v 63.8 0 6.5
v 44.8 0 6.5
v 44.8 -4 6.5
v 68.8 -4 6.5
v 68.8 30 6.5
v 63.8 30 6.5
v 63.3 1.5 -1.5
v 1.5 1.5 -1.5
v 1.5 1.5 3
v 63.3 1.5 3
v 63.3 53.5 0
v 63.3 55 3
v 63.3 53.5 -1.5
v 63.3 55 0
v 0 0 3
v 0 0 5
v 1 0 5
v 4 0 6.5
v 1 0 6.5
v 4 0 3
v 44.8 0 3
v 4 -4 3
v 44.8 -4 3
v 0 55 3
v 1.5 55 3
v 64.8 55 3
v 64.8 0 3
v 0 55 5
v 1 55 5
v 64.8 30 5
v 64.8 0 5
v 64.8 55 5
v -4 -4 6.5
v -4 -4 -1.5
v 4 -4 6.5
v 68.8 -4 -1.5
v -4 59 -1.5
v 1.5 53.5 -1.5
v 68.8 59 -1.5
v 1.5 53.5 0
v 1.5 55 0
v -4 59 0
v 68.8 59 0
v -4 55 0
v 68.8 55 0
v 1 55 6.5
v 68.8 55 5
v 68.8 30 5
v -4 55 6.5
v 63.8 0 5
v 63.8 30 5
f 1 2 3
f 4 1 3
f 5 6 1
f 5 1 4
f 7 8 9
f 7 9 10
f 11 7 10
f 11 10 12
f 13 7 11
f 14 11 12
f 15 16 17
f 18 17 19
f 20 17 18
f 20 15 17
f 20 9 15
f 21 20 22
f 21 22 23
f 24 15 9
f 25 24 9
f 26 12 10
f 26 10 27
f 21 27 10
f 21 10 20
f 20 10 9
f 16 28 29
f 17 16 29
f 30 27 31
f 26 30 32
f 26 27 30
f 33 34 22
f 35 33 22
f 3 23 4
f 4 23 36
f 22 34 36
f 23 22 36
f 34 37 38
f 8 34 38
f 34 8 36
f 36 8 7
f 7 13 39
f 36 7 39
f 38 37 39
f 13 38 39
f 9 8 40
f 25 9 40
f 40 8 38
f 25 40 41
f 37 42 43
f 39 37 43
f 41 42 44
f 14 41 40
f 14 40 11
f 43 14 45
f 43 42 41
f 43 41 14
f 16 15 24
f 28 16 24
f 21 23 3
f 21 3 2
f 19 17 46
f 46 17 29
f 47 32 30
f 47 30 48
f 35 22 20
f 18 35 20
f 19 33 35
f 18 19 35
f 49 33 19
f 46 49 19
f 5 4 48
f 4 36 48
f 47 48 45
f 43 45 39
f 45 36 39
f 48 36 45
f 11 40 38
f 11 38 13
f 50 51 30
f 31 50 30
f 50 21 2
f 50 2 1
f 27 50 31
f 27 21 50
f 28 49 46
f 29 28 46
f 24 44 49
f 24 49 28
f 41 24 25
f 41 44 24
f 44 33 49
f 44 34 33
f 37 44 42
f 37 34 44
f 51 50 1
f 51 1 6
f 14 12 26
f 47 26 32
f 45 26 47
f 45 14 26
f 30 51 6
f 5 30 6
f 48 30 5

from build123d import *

# Parameters (mm, degrees)
BOX004_W      = 4
BOX004_H      = 55
BOX004_DEPTH  = 2
BOX005_W      = 4
BOX005_H      = 55
BOX005_DEPTH  = 2
BOX006_W      = 5
BOX006_H      = 30
BOX006_DEPTH  = 1.5
BOX007_W      = 24
BOX007_H      = 4
BOX007_DEPTH  = 3.5
BOX010_W      = 8
BOX010_H      = 4
BOX010_DEPTH  = 3.5
BOX003_W      = 5
BOX003_H      = 55
BOX003_DEPTH  = 1.5
BOX011_W      = 5.5
BOX011_H      = 59
BOX011_DEPTH  = 3
BOX012_W      = 5.5
BOX012_H      = 59
BOX012_DEPTH  = 3
BOX013_W      = 68.8
BOX013_H      = 5.5
BOX013_DEPTH  = 3
SKETCH003_W   = 72.8
SKETCH003_H   = 63
SKETCH003_W_2 = 61.8
SKETCH003_H_2 = 52
PAD003_DEPTH  = 1.5


with BuildPart() as middle_pad:
    # Box004 → Box004 (new body)
    with BuildSketch(Plane(origin=(-4, 0, 0), x_dir=(1, 0, 0), z_dir=(0, 0, 1))):
        with Locations((2, 27.5)):
            Rectangle(BOX004_W, BOX004_H)
    extrude(amount=BOX004_DEPTH)


with BuildPart() as middle_pad001:
    # Box005 → Box005 (new body)
    with BuildSketch(Plane(origin=(64.8, 0, 0), x_dir=(1, 0, 0), z_dir=(0, 0, 1))):
        with Locations((2, 27.5)):
            Rectangle(BOX005_W, BOX005_H)
    extrude(amount=BOX005_DEPTH)


with BuildPart() as top_cover001:
    # Box006 → Box006 (new body)
    with BuildSketch(Plane(origin=(63.8, 0, 2), x_dir=(1, 0, 0), z_dir=(0, 0, 1))):
        with Locations((2.5, 15)):
            Rectangle(BOX006_W, BOX006_H)
    extrude(amount=BOX006_DEPTH)


with BuildPart() as middle_pad002:
    # Box007 → Box007 (new body)
    with BuildSketch(Plane(origin=(44.8, -4, 0), x_dir=(1, 0, 0), z_dir=(0, 0, 1))):
        with Locations((12, 2)):
            Rectangle(BOX007_W, BOX007_H)
    extrude(amount=BOX007_DEPTH)


with BuildPart() as side_pad:
    # Box010 → Box010 (new body)
    with BuildSketch(Plane(origin=(-4, -4, 0), x_dir=(1, 0, 0), z_dir=(0, 0, 1))):
        with Locations((4, 2)):
            Rectangle(BOX010_W, BOX010_H)
    extrude(amount=BOX010_DEPTH)


with BuildPart() as fusion002:
    # Box003 → Box003 (new body)
    with BuildSketch(Plane(origin=(-4, 0, 2), x_dir=(1, 0, 0), z_dir=(0, 0, 1))):
        with Locations((2.5, 27.5)):
            Rectangle(BOX003_W, BOX003_H)
    extrude(amount=BOX003_DEPTH)

    # Fusion002: union middle_pad, middle_pad001, top cover001, middle_pad002, side_pad
    add(middle_pad.part)
    add(middle_pad001.part)
    add(top_cover001.part)
    add(middle_pad002.part)
    add(side_pad.part)


with BuildPart() as fusion002_1:
    # Fusion002 placement: moved
    add(fusion002.part.moved(Location((0, 0, 3))))


with BuildPart() as cube003:
    # Box011 → Box011 (new body)
    with BuildSketch(Plane(origin=(-4, -4, 0), x_dir=(1, 0, 0), z_dir=(0, 0, 1))):
        with Locations((2.75, 29.5)):
            Rectangle(BOX011_W, BOX011_H)
    extrude(amount=BOX011_DEPTH)


with BuildPart() as cube004:
    # Box012 → Box012 (new body)
    with BuildSketch(Plane(origin=(63.3, -4, 0), x_dir=(1, 0, 0), z_dir=(0, 0, 1))):
        with Locations((2.75, 29.5)):
            Rectangle(BOX012_W, BOX012_H)
    extrude(amount=BOX012_DEPTH)


with BuildPart() as cube005:
    # Box013 → Box013 (new body)
    with BuildSketch(Plane(origin=(-1.5, -4, 0), x_dir=(1, 0, 0), z_dir=(0, 0, 1))):
        with Locations((34.4, 2.75)):
            Rectangle(BOX013_W, BOX013_H)
    extrude(amount=BOX013_DEPTH)


with BuildPart() as fusion001:
    # Sketch003 → Pad003 (new body)
    with BuildSketch(Plane.XY):
        with Locations((32.4, 27.5)):
            Rectangle(SKETCH003_W, SKETCH003_H)
        with Locations((32.4, 27.5)):
            Rectangle(SKETCH003_W_2, SKETCH003_H_2, mode=Mode.SUBTRACT)
    extrude(amount=-PAD003_DEPTH)

    # Fusion001: union Fusion002, Cube003, Cube004, Cube005
    add(fusion002_1.part)
    add(cube003.part)
    add(cube004.part)
    add(cube005.part)


solid = fusion001.part
